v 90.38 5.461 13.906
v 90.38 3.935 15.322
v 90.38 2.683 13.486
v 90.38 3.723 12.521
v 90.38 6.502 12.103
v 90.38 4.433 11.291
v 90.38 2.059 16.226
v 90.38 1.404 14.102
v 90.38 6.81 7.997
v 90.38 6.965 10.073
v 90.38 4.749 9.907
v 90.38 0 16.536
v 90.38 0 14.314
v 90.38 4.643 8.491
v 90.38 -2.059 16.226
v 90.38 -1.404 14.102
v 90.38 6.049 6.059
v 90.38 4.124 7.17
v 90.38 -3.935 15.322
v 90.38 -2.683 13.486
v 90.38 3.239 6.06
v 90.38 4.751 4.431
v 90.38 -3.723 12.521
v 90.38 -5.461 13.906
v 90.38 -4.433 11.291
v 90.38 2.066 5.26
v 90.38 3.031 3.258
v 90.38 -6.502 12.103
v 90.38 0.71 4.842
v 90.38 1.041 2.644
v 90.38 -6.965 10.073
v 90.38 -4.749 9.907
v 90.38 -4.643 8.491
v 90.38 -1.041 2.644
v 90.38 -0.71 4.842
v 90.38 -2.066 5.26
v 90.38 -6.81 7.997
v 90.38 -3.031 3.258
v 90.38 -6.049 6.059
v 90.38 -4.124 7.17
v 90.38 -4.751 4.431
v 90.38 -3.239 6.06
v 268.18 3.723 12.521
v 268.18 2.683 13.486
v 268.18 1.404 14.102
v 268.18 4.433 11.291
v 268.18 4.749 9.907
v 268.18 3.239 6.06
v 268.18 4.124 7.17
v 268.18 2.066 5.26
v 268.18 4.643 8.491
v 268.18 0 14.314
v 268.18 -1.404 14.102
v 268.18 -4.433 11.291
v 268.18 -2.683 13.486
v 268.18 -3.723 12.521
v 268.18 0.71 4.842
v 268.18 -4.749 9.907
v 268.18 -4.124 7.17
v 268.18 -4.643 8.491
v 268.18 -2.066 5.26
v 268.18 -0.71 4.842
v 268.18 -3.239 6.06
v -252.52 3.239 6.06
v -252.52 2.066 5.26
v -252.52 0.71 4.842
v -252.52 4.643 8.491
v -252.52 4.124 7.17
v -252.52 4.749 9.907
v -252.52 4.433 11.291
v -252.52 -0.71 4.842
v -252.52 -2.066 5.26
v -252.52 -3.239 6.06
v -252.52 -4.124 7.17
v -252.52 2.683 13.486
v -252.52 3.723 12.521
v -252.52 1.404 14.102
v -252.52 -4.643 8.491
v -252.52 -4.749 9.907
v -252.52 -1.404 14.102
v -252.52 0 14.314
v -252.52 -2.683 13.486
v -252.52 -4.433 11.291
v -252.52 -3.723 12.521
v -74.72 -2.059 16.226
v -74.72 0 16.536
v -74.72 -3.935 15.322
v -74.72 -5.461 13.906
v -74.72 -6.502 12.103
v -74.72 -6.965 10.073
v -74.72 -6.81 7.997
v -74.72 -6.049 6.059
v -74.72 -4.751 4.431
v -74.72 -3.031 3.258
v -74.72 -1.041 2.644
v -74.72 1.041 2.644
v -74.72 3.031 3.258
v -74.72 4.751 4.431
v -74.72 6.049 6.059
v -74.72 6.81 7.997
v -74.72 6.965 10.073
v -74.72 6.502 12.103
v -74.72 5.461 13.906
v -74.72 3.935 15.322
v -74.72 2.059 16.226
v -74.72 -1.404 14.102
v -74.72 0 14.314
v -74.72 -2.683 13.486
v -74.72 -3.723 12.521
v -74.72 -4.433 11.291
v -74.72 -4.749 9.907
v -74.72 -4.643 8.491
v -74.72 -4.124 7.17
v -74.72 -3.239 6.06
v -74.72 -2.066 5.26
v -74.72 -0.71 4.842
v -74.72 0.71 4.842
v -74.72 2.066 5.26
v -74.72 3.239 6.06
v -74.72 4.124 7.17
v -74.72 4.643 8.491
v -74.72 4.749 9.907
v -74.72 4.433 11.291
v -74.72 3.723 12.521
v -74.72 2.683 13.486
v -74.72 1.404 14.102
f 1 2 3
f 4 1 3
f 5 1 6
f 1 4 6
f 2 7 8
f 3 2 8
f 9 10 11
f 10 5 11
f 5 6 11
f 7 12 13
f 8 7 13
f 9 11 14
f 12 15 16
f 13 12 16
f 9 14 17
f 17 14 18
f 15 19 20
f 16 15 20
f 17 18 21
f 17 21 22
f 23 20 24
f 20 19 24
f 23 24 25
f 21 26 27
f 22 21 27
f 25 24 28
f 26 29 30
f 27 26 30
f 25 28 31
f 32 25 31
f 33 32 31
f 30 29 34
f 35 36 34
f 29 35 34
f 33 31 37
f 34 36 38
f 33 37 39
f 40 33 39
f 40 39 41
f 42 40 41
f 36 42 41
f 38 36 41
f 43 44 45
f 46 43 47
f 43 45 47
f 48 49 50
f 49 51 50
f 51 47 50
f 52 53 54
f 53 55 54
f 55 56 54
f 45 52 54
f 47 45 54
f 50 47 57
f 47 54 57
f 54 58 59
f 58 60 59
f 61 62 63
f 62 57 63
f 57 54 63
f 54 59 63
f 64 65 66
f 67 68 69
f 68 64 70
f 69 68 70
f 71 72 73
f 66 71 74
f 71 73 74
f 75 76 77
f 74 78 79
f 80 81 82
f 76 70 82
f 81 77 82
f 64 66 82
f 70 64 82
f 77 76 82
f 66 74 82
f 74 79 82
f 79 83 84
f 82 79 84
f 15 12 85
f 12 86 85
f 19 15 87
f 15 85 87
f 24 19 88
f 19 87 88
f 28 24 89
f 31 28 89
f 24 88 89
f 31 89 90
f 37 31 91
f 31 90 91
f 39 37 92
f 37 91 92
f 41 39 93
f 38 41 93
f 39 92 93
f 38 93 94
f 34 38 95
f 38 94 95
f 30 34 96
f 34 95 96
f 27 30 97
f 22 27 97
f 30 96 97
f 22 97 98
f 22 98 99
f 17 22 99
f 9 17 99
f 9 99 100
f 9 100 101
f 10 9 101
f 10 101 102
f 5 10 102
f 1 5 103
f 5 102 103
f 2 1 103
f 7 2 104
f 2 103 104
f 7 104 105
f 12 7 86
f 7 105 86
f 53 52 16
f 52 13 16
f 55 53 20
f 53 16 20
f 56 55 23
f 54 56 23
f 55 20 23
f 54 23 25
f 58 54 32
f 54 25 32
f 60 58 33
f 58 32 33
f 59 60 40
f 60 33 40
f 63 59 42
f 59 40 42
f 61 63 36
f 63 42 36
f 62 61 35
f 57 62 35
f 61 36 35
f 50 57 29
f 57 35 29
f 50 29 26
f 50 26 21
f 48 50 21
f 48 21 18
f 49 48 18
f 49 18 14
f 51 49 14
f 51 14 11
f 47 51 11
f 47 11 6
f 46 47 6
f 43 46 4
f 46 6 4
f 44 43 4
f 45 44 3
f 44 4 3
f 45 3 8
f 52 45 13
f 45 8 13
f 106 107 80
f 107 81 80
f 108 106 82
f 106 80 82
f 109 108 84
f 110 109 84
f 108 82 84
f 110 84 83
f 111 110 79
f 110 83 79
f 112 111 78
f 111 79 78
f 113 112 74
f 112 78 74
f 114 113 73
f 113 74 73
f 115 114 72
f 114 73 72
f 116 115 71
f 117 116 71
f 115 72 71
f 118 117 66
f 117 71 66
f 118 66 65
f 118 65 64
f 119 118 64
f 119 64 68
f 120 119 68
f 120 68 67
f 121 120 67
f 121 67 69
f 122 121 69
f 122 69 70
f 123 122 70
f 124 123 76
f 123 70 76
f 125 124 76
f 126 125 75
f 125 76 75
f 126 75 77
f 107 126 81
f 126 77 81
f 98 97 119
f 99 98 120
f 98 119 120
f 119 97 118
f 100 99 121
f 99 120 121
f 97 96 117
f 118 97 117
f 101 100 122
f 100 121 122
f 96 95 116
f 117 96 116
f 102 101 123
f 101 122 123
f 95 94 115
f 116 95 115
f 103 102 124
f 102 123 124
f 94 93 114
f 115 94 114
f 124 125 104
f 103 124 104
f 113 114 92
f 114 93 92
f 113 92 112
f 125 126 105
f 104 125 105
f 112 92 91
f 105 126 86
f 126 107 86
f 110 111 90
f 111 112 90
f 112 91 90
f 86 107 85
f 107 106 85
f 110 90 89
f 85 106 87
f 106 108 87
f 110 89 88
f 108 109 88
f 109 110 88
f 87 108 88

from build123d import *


with BuildPart() as f1:
    # F0 (on Front) → F1 (revolve)
    with BuildSketch(Plane.XZ):
        Polygon((-74.720278, 14.313716), (-252.520278, 14.313716), (-252.520278, 9.551216), (268.179722, 9.551216), (268.179722, 14.313716), (90.379722, 14.313716), align=None)
        Polygon((-74.720278, 16.536216), (-74.720278, 14.313716), (90.379722, 14.313716), (90.379722, 16.536216), (7.829722, 16.536216), align=None)
    revolve(axis=Axis((7.829722, 0, 9.551216), (1, 0, 0)))


solid = f1.part
